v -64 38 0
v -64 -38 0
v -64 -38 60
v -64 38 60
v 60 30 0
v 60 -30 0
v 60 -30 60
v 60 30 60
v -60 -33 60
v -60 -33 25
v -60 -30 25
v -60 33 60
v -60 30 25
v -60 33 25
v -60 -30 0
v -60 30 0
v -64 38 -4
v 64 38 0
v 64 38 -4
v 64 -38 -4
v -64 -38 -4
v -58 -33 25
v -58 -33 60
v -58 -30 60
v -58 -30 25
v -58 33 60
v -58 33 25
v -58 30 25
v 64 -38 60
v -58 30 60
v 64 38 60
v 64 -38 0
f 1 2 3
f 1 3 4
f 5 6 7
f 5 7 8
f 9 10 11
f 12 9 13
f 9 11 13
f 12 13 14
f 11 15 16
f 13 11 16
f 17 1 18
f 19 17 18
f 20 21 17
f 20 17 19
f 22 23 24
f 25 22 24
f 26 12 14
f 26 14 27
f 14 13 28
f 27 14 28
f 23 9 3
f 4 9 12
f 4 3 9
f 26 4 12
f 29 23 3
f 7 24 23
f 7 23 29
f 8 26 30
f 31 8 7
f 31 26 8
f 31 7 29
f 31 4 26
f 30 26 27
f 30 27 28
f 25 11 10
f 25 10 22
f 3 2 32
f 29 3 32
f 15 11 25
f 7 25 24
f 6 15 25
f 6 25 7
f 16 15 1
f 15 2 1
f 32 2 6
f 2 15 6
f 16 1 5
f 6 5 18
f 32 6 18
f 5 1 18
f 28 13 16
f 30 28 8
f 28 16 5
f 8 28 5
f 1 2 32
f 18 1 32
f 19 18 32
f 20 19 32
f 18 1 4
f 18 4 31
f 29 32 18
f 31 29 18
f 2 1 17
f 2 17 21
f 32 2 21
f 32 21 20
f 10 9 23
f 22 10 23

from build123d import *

# Parameters (mm, degrees)
F0_W     = 128
F0_H     = 76
F0_W_2   = 120
F0_H_2   = 60
F1_DEPTH = 60
F2_W     = 2
F2_H     = 3
F3_DEPTH = 35
F4_W     = 128
F4_H     = 76
F5_DEPTH = 4


# Not quite as in the source:
# - a pattern or mirror of a feature is missing from the dataset's text; its kind, count and spacing are read off the source's solid


with BuildPart() as f1:
    # F0 (on Top) → F1 (new body)
    with BuildSketch(Plane.XY):
        Rectangle(F0_W, F0_H)
        Rectangle(F0_W_2, F0_H_2, mode=Mode.SUBTRACT)
    extrude(amount=F1_DEPTH)

    # F2 (on face) → F3 (cut)
    with BuildSketch(Plane.XY.offset(60)):
        with Locations((-59, -31.5)):
            Rectangle(F2_W, F2_H)
    f3 = extrude(amount=-F3_DEPTH, mode=Mode.SUBTRACT)

    # F3_copies: F3 across plane
    add(f3.mirror(Plane.ZX), mode=Mode.SUBTRACT)


with BuildPart() as f5:
    # F4 (on face) → F5 (new body)
    with BuildSketch(Plane(origin=(0, 0, 0), x_dir=(1, 0, 0), z_dir=(0, 0, -1))):
        Rectangle(F4_W, F4_H)
    extrude(amount=F5_DEPTH)


solid = Compound([f1.part, f5.part])
